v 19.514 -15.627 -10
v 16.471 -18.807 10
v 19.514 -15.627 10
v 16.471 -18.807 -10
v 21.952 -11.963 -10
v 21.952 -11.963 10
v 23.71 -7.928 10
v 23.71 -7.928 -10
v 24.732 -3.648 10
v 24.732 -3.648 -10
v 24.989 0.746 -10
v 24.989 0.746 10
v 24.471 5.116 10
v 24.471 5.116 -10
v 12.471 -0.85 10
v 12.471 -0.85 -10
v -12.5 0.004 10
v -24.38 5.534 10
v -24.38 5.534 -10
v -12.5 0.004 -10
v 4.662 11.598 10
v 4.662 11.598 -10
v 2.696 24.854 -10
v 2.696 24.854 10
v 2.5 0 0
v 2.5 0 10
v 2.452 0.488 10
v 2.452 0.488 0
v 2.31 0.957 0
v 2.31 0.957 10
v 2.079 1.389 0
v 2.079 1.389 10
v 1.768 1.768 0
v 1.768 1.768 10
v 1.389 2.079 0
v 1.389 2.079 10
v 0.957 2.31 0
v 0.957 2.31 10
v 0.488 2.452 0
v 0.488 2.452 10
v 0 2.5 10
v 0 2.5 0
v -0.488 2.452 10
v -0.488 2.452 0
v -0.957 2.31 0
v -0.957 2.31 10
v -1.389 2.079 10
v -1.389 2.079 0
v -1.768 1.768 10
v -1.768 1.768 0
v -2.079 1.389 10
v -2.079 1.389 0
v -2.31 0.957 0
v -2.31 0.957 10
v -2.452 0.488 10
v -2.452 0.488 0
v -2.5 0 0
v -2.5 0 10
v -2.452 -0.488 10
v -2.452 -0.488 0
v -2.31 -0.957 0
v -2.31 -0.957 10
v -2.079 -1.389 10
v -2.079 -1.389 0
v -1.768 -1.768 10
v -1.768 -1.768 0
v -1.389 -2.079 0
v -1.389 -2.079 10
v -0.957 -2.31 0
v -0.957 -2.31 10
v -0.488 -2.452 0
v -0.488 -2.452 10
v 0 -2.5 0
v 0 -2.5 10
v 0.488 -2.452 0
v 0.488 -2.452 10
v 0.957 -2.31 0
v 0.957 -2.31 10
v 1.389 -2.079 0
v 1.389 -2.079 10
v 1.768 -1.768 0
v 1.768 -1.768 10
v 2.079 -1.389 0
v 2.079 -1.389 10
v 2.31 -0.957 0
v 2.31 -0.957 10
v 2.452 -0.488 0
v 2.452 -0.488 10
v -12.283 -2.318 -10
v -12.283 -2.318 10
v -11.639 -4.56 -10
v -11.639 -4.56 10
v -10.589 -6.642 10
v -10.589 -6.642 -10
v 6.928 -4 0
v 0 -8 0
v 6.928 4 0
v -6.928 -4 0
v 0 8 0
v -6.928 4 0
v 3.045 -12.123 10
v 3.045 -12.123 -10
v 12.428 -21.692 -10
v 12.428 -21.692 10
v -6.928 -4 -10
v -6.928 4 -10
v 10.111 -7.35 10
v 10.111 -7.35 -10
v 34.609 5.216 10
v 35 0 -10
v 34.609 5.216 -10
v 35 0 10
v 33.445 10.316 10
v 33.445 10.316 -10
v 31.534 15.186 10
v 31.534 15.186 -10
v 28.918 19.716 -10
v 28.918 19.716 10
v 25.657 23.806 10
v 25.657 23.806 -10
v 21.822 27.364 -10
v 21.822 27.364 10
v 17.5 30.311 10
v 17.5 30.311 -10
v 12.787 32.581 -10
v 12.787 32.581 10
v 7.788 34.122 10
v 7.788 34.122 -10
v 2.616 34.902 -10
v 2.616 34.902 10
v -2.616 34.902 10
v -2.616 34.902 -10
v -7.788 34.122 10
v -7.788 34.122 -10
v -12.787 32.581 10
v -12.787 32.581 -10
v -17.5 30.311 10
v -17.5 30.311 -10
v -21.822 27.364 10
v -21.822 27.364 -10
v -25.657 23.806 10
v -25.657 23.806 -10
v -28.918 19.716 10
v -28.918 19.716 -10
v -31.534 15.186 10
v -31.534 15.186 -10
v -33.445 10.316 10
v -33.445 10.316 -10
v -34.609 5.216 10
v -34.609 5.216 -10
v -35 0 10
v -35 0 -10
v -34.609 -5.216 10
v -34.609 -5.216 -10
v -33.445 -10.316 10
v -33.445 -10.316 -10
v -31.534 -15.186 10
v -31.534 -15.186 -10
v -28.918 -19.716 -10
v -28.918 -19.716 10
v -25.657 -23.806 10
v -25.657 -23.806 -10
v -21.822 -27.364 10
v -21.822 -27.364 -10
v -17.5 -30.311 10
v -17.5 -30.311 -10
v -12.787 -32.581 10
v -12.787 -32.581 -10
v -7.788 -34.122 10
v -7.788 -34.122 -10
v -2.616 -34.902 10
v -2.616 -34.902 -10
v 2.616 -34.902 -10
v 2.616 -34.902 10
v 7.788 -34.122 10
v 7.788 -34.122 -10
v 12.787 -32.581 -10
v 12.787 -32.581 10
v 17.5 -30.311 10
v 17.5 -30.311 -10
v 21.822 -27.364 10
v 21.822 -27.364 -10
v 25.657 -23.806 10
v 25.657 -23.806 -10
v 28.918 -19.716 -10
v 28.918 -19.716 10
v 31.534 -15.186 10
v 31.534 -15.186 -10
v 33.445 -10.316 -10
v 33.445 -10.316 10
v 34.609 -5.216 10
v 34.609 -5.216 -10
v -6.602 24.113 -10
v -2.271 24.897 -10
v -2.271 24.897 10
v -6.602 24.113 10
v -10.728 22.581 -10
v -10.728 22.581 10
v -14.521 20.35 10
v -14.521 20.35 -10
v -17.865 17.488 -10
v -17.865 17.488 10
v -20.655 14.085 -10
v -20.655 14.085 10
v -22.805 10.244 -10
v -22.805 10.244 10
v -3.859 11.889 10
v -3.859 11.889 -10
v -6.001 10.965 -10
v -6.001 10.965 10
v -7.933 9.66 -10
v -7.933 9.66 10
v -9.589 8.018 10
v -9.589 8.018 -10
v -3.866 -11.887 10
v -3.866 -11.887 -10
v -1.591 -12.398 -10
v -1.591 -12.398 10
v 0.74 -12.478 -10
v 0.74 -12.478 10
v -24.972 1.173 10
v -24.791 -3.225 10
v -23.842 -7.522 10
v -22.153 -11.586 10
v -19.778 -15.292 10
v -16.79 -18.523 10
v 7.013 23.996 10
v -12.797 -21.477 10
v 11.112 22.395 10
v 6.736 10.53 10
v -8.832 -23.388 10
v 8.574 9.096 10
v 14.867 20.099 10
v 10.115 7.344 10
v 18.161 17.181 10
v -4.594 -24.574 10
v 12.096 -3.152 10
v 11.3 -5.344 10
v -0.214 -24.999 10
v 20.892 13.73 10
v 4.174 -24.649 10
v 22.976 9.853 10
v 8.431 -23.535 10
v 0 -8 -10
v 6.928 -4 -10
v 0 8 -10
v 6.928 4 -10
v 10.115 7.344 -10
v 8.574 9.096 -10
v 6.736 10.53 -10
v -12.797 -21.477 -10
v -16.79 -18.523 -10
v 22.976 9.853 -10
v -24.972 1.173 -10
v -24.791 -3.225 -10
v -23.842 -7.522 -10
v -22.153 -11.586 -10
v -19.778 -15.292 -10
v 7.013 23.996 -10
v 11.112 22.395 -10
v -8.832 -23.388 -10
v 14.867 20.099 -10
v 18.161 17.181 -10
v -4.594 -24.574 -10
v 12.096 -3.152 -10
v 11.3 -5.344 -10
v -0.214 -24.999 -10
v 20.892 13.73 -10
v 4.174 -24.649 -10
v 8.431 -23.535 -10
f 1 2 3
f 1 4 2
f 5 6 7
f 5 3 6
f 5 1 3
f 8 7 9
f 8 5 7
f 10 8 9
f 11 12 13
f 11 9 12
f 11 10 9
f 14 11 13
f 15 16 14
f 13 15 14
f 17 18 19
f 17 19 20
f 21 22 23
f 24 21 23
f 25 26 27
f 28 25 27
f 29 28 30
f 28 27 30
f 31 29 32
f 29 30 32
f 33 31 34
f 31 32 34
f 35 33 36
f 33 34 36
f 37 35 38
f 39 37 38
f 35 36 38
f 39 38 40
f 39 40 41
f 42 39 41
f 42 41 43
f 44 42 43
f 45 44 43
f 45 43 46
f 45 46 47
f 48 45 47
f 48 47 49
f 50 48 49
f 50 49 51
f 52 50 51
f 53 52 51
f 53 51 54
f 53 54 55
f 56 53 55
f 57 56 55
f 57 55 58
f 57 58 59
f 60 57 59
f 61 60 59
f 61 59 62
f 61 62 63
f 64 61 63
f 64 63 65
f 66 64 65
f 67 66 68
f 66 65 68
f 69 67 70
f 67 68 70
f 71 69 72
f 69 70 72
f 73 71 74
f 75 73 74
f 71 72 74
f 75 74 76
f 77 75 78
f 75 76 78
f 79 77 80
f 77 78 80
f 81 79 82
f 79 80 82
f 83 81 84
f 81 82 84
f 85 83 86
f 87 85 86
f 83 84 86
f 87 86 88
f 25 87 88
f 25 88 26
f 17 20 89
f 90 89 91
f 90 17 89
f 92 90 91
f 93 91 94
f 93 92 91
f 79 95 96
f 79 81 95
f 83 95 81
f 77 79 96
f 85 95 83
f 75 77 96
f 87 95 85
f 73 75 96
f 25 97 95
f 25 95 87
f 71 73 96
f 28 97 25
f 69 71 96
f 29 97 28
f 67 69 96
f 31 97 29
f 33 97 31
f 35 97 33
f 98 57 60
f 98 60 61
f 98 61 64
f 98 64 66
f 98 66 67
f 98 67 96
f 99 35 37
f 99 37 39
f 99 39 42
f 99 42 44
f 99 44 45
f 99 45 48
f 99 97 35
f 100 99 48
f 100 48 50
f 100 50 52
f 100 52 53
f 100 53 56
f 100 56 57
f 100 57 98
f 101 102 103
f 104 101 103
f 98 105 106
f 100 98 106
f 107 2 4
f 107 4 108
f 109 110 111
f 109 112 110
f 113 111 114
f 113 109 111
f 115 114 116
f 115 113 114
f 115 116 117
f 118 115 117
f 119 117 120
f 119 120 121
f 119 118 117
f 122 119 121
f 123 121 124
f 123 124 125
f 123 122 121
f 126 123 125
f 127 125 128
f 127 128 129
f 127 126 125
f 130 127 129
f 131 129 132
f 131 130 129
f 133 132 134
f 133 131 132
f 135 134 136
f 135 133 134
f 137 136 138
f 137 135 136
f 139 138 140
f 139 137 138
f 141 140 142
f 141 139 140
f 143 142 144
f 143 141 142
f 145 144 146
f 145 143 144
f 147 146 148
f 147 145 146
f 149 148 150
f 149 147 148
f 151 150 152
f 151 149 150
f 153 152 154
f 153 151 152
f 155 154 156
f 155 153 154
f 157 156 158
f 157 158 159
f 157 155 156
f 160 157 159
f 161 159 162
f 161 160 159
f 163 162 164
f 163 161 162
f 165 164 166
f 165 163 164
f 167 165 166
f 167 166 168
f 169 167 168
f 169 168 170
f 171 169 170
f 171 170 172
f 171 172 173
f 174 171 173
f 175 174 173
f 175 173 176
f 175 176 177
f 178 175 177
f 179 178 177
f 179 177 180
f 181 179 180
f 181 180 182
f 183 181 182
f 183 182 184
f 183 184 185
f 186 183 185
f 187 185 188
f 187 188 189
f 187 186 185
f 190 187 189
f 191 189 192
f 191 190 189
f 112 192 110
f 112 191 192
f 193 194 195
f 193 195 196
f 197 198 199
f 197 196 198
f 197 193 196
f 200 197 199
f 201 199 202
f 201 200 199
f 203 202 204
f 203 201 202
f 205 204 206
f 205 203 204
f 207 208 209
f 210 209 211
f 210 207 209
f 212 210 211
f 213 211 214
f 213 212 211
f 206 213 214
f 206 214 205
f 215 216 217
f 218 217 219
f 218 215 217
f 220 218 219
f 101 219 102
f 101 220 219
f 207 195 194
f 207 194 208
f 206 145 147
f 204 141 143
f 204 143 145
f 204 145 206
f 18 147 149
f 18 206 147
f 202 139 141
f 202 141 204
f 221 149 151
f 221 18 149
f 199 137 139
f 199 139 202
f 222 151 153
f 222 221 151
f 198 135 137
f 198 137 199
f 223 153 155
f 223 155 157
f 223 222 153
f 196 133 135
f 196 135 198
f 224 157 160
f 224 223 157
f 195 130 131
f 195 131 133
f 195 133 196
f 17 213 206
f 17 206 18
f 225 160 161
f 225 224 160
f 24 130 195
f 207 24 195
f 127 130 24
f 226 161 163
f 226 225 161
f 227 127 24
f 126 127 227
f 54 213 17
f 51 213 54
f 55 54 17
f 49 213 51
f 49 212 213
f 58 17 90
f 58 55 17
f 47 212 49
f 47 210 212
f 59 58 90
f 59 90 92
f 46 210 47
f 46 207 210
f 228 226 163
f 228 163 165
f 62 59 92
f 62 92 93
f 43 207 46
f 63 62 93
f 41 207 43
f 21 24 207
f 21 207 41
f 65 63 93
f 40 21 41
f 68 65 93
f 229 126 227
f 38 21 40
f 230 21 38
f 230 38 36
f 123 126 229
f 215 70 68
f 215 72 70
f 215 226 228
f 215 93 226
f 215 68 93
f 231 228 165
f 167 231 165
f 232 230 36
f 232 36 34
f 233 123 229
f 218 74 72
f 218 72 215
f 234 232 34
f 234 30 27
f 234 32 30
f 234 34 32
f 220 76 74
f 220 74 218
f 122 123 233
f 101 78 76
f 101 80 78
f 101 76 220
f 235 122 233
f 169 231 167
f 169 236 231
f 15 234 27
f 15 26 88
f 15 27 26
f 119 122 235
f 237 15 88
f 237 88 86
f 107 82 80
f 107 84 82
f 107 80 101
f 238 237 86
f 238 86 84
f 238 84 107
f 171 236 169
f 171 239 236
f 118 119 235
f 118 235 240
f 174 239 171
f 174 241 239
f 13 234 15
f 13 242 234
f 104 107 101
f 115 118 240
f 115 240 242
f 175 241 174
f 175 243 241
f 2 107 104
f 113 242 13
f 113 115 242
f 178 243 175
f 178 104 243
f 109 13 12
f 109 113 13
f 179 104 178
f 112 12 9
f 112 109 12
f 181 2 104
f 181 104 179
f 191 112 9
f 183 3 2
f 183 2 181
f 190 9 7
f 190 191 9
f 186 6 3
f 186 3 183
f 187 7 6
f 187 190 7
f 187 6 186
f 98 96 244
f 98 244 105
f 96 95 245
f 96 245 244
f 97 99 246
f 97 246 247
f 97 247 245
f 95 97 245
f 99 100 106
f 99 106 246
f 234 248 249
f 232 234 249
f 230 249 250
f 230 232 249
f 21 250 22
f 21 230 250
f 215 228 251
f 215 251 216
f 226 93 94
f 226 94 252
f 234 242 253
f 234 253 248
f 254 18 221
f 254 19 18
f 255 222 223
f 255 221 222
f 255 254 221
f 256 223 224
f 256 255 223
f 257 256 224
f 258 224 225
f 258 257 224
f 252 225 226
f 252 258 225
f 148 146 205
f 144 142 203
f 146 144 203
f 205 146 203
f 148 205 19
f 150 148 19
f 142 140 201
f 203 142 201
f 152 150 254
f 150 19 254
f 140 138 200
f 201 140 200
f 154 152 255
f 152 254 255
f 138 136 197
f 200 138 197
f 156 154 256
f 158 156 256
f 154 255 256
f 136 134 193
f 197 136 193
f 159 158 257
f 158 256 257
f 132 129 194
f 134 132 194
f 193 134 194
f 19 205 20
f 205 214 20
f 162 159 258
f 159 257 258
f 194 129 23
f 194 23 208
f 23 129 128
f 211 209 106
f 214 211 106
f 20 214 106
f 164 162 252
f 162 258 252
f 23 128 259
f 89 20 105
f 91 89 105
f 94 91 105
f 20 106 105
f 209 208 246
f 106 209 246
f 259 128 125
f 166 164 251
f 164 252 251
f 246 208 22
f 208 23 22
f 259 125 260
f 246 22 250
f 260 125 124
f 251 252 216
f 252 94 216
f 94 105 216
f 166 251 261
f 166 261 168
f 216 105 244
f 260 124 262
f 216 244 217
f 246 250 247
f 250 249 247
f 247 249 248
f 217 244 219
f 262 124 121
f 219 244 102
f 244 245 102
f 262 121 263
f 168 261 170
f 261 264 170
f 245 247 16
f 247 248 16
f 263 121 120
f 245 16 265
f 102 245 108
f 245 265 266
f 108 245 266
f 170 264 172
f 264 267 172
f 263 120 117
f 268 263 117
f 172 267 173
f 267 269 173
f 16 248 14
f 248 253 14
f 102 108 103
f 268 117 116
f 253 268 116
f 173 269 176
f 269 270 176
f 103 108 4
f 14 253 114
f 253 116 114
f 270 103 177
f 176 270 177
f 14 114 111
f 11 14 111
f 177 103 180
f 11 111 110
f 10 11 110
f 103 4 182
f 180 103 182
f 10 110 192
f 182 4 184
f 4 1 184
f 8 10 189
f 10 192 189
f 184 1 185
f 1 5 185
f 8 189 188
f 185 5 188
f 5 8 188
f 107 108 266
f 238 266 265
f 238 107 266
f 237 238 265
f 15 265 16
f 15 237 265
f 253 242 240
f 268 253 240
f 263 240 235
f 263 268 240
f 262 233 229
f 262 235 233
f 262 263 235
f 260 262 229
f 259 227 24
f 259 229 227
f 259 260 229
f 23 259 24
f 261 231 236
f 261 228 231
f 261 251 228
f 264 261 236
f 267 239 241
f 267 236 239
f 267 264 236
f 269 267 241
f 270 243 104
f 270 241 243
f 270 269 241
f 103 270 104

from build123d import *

# Parameters (mm, degrees)
SKETCH_1_R               = 35
SKETCH_1_R_2             = 25
EXTRUDE_1_DEPTH          = 10
SKETCH_2_R               = 12.5
EXTRUDE_2_DEPTH          = 10
PATTERN_CIRCULAR_1_COUNT = 5
SKETCH_3_R               = 2.5
CUT_EXTRUDE_1_DEPTH      = 54.38539126
CUT_EXTRUDE_2_DEPTH      = 10


with BuildPart() as part:
    # 草图1 → 凸台-拉伸1 (new, symmetric)
    with BuildSketch(Plane.XY):
        Circle(SKETCH_1_R)
        Circle(SKETCH_1_R_2, mode=Mode.SUBTRACT)
    extrude(amount=EXTRUDE_1_DEPTH, both=True)

    # 草图2 → 凸台-拉伸2 (add, symmetric)
    with BuildSketch(Plane.XY):
        Circle(SKETCH_2_R)
        with BuildLine():
            Line((-1.438766033, 31.712801318), (-3.859353097, 11.889297443))
            ThreePointArc((-3.859353097, 11.889297443), (0.427174783, 12.492698736), (4.662473362, 11.597902489))
            Line((4.662473362, 11.597902489), (1.678560372, 31.712801318))
            Line((1.678560372, 31.712801318), (-1.438766033, 31.712801318))
        make_face()
    extrude_2 = extrude(amount=EXTRUDE_2_DEPTH, both=True)

    # 阵列(圆周)1: 凸台-拉伸2 ×5 about axis
    pattern_circular_1_axis = Axis((0, 0, 0), (0, 0, 1))
    for i in range(1, PATTERN_CIRCULAR_1_COUNT):
        add(extrude_2.rotate(pattern_circular_1_axis, i * 360 / PATTERN_CIRCULAR_1_COUNT))

    # 草图3 → 切除-拉伸1 (cut, through all)
    with BuildSketch(Plane.XY.offset(10)):
        Circle(SKETCH_3_R)
    extrude(amount=-CUT_EXTRUDE_1_DEPTH, mode=Mode.SUBTRACT)

    # 草图4 → 切除-拉伸2 (cut)
    with BuildSketch(Plane(origin=(0, 0, -10), x_dir=(-1, 0, 0), z_dir=(0, 0, -1))):
        Polygon((0, 8), (-6.92820323, 4), (-6.92820323, -4), (0, -8), (6.92820323, -4), (6.92820323, 4), align=None)
    extrude(amount=-CUT_EXTRUDE_2_DEPTH, mode=Mode.SUBTRACT)


solid = part.part
